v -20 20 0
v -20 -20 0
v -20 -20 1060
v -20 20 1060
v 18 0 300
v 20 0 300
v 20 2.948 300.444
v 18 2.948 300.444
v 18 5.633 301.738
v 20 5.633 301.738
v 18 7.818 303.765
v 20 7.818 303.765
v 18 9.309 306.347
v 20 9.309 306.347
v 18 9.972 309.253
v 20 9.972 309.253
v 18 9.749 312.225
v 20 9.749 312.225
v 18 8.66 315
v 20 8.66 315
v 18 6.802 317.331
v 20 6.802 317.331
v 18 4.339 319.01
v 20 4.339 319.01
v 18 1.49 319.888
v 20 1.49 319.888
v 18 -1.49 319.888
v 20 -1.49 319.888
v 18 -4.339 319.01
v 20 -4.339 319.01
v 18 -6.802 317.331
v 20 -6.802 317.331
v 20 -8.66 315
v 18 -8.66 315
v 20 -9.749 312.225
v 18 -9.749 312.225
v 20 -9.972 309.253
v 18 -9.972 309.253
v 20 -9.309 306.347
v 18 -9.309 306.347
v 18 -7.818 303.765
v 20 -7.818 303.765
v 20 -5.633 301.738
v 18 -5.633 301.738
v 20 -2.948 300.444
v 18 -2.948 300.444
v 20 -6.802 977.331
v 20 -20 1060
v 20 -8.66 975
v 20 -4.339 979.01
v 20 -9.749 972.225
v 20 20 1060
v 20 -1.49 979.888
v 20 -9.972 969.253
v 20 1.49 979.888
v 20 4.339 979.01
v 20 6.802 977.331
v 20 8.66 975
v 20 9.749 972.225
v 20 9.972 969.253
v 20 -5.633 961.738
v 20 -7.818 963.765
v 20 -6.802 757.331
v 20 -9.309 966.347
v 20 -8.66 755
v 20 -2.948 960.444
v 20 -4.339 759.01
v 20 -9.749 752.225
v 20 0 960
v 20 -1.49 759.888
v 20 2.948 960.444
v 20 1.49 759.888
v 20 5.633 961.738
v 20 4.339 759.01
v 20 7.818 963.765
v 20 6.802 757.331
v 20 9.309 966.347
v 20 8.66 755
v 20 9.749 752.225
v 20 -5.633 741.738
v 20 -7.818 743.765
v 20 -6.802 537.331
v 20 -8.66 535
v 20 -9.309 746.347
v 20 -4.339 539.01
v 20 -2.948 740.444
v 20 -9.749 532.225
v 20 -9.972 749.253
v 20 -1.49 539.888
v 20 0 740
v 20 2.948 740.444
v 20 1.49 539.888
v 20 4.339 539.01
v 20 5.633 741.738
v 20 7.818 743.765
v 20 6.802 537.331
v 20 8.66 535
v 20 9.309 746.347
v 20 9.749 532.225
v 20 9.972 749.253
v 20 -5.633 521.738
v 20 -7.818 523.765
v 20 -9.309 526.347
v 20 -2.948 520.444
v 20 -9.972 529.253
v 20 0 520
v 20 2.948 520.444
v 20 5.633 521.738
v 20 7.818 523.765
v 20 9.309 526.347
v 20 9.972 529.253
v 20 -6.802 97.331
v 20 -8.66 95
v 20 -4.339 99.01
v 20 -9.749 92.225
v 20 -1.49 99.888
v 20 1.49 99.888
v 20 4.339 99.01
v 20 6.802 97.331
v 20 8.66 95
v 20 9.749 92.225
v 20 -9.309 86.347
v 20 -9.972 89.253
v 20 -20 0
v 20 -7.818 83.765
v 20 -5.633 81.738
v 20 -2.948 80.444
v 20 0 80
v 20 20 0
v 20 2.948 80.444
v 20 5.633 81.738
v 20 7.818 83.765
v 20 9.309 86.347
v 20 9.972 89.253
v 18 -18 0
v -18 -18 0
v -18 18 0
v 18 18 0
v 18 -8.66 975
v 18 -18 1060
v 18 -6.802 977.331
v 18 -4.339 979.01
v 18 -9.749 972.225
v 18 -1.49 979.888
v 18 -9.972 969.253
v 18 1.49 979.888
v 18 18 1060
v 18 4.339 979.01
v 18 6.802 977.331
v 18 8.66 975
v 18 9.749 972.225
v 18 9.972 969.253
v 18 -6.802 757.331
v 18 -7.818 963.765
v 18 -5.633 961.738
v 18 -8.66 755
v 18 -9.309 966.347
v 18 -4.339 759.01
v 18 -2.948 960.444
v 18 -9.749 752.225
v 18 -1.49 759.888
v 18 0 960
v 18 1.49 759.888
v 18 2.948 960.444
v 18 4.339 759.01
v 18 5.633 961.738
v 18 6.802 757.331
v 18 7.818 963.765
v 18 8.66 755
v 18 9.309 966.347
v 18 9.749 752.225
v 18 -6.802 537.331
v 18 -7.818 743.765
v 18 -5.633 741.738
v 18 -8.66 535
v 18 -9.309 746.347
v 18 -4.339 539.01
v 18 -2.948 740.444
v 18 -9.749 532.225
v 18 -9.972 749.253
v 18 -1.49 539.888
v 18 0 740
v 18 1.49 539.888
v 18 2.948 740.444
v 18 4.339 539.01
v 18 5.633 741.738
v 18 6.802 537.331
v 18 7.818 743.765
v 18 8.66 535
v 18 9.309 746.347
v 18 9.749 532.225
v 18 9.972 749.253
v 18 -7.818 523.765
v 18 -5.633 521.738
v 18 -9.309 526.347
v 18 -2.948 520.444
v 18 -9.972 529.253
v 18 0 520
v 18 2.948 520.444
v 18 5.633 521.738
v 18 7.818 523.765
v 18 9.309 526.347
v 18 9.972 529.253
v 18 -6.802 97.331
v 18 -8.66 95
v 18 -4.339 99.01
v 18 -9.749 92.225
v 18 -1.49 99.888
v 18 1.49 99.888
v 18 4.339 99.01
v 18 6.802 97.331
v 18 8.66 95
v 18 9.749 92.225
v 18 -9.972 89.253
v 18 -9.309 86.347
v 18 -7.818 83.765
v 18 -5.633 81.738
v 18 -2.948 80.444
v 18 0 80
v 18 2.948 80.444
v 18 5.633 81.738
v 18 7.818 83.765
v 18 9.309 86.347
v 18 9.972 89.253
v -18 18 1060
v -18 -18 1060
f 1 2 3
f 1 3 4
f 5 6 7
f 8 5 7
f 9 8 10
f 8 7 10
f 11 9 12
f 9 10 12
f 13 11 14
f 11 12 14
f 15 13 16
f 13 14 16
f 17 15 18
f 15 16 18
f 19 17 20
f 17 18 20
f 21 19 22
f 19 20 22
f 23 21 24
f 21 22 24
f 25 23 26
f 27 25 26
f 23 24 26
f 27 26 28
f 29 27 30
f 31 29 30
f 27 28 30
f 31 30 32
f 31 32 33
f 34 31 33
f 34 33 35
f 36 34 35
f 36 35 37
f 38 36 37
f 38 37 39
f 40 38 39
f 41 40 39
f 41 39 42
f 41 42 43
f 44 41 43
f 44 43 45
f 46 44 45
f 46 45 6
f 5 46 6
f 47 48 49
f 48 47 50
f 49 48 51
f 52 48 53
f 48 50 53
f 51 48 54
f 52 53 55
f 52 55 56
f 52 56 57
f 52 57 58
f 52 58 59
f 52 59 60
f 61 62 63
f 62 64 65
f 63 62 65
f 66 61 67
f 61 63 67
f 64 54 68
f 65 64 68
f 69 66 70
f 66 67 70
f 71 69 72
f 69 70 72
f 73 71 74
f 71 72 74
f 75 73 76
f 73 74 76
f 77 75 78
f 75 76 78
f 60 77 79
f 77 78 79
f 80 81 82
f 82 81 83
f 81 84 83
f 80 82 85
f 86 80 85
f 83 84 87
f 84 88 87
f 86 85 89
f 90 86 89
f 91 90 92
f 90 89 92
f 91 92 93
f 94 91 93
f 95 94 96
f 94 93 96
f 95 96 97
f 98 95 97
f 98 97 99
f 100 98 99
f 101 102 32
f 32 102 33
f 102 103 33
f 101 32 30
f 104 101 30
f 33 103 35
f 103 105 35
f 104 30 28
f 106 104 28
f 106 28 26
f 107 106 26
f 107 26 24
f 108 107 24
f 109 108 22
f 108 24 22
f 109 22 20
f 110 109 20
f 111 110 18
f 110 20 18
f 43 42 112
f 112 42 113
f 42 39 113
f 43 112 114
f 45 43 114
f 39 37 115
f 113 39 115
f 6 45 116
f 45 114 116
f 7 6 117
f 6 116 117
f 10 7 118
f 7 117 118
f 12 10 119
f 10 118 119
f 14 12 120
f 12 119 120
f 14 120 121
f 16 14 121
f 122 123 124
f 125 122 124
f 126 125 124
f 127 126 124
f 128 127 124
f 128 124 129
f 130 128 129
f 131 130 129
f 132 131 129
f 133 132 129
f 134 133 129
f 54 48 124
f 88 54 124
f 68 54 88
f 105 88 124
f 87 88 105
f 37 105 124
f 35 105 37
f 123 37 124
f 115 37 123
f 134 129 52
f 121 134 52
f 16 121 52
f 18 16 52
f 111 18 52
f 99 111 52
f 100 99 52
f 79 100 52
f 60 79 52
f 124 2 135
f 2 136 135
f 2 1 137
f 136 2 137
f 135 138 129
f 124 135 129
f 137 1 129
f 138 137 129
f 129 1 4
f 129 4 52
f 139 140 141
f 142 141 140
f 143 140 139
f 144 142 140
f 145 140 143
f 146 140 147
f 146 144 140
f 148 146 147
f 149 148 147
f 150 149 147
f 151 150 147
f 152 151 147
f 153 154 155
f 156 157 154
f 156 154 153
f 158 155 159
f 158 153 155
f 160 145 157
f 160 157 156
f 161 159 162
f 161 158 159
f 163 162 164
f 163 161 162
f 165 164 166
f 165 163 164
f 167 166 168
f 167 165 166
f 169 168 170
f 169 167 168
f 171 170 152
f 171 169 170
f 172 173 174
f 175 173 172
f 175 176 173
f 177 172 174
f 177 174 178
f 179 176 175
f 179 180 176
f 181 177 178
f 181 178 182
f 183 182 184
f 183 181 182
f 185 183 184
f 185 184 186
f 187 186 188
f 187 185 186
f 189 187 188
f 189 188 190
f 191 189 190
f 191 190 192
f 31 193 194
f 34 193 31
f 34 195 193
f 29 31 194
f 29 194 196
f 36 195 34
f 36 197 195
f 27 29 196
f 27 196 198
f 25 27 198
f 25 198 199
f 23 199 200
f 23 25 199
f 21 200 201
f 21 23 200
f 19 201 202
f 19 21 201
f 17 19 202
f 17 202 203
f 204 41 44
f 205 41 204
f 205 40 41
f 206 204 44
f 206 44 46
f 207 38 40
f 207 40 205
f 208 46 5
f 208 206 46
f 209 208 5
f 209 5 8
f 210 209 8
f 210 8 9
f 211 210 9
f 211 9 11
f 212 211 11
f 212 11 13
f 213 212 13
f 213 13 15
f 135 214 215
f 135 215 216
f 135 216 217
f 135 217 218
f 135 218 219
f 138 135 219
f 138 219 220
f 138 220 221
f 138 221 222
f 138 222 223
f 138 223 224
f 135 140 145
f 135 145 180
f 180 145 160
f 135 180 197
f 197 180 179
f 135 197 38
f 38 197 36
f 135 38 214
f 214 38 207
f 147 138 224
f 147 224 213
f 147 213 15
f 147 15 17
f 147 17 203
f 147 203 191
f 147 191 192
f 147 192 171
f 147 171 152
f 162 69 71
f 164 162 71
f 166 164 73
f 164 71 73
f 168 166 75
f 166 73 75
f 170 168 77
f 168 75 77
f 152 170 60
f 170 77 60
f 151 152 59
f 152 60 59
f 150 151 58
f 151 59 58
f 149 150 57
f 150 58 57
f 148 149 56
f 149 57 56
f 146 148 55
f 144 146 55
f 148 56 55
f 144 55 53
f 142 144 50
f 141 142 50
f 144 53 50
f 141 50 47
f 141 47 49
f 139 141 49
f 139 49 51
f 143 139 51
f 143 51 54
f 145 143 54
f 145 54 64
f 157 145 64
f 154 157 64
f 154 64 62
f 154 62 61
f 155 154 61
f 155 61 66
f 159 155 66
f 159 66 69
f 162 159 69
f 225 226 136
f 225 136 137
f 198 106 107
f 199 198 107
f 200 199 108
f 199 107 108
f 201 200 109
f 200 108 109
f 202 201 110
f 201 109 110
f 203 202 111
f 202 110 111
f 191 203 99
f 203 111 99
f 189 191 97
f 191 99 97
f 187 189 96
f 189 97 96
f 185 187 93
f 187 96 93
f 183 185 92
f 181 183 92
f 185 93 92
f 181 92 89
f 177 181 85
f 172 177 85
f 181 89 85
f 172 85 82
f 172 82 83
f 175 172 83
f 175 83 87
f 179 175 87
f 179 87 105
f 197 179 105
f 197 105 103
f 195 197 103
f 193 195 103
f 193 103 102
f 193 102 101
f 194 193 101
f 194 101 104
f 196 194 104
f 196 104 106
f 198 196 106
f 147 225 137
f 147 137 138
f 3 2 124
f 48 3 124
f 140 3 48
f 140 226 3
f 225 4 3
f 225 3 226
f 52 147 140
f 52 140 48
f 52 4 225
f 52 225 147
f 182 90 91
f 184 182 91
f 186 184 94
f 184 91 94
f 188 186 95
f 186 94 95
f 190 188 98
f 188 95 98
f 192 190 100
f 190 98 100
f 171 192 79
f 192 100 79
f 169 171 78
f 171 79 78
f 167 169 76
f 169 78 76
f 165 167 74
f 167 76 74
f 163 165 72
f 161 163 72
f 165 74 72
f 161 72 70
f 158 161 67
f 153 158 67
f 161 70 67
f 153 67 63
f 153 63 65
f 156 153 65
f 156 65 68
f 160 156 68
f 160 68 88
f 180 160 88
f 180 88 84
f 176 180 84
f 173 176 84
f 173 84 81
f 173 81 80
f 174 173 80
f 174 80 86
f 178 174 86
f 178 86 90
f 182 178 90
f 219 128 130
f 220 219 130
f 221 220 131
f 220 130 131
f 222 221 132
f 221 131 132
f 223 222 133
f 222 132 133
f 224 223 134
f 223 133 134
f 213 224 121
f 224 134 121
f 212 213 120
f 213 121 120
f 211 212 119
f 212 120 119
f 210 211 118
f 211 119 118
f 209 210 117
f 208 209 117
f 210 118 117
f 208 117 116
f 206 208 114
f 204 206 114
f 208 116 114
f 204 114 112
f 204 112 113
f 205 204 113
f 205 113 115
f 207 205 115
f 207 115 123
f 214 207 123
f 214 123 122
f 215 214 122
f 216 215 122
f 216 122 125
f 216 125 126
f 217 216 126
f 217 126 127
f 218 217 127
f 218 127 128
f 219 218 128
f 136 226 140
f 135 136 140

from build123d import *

# Parameters (mm, degrees)
CROQUIS1_W            = 40
CROQUIS1_H            = 40
CROQUIS1_W_2          = 36
CROQUIS1_H_2          = 36
EXTRUIR_L_MINA1_DEPTH = 1060
CROQUIS2_R            = 10
EXTRUIR1_DEPTH        = 10


with BuildPart() as part:
    # Croquis1 → Extruir-Lámina1 (new body)
    with BuildSketch(Plane.XY):
        Rectangle(CROQUIS1_W, CROQUIS1_H)
        Rectangle(CROQUIS1_W_2, CROQUIS1_H_2, mode=Mode.SUBTRACT)
    extrude(amount=EXTRUIR_L_MINA1_DEPTH)

    # Croquis2 → Extruir1 (cut)
    with BuildSketch(Plane(origin=(20, 0, 0), x_dir=(0, 0, -1), z_dir=(1, 0, 0))):
        with Locations((-530, 0)):
            Circle(CROQUIS2_R)
        with Locations((-310, 0)):
            Circle(CROQUIS2_R)
        with Locations((-90, 0)):
            Circle(CROQUIS2_R)
        with Locations((-750, 0)):
            Circle(CROQUIS2_R)
        with Locations((-970, 0)):
            Circle(CROQUIS2_R)
    extrude(amount=-EXTRUIR1_DEPTH, mode=Mode.SUBTRACT)


solid = part.part
